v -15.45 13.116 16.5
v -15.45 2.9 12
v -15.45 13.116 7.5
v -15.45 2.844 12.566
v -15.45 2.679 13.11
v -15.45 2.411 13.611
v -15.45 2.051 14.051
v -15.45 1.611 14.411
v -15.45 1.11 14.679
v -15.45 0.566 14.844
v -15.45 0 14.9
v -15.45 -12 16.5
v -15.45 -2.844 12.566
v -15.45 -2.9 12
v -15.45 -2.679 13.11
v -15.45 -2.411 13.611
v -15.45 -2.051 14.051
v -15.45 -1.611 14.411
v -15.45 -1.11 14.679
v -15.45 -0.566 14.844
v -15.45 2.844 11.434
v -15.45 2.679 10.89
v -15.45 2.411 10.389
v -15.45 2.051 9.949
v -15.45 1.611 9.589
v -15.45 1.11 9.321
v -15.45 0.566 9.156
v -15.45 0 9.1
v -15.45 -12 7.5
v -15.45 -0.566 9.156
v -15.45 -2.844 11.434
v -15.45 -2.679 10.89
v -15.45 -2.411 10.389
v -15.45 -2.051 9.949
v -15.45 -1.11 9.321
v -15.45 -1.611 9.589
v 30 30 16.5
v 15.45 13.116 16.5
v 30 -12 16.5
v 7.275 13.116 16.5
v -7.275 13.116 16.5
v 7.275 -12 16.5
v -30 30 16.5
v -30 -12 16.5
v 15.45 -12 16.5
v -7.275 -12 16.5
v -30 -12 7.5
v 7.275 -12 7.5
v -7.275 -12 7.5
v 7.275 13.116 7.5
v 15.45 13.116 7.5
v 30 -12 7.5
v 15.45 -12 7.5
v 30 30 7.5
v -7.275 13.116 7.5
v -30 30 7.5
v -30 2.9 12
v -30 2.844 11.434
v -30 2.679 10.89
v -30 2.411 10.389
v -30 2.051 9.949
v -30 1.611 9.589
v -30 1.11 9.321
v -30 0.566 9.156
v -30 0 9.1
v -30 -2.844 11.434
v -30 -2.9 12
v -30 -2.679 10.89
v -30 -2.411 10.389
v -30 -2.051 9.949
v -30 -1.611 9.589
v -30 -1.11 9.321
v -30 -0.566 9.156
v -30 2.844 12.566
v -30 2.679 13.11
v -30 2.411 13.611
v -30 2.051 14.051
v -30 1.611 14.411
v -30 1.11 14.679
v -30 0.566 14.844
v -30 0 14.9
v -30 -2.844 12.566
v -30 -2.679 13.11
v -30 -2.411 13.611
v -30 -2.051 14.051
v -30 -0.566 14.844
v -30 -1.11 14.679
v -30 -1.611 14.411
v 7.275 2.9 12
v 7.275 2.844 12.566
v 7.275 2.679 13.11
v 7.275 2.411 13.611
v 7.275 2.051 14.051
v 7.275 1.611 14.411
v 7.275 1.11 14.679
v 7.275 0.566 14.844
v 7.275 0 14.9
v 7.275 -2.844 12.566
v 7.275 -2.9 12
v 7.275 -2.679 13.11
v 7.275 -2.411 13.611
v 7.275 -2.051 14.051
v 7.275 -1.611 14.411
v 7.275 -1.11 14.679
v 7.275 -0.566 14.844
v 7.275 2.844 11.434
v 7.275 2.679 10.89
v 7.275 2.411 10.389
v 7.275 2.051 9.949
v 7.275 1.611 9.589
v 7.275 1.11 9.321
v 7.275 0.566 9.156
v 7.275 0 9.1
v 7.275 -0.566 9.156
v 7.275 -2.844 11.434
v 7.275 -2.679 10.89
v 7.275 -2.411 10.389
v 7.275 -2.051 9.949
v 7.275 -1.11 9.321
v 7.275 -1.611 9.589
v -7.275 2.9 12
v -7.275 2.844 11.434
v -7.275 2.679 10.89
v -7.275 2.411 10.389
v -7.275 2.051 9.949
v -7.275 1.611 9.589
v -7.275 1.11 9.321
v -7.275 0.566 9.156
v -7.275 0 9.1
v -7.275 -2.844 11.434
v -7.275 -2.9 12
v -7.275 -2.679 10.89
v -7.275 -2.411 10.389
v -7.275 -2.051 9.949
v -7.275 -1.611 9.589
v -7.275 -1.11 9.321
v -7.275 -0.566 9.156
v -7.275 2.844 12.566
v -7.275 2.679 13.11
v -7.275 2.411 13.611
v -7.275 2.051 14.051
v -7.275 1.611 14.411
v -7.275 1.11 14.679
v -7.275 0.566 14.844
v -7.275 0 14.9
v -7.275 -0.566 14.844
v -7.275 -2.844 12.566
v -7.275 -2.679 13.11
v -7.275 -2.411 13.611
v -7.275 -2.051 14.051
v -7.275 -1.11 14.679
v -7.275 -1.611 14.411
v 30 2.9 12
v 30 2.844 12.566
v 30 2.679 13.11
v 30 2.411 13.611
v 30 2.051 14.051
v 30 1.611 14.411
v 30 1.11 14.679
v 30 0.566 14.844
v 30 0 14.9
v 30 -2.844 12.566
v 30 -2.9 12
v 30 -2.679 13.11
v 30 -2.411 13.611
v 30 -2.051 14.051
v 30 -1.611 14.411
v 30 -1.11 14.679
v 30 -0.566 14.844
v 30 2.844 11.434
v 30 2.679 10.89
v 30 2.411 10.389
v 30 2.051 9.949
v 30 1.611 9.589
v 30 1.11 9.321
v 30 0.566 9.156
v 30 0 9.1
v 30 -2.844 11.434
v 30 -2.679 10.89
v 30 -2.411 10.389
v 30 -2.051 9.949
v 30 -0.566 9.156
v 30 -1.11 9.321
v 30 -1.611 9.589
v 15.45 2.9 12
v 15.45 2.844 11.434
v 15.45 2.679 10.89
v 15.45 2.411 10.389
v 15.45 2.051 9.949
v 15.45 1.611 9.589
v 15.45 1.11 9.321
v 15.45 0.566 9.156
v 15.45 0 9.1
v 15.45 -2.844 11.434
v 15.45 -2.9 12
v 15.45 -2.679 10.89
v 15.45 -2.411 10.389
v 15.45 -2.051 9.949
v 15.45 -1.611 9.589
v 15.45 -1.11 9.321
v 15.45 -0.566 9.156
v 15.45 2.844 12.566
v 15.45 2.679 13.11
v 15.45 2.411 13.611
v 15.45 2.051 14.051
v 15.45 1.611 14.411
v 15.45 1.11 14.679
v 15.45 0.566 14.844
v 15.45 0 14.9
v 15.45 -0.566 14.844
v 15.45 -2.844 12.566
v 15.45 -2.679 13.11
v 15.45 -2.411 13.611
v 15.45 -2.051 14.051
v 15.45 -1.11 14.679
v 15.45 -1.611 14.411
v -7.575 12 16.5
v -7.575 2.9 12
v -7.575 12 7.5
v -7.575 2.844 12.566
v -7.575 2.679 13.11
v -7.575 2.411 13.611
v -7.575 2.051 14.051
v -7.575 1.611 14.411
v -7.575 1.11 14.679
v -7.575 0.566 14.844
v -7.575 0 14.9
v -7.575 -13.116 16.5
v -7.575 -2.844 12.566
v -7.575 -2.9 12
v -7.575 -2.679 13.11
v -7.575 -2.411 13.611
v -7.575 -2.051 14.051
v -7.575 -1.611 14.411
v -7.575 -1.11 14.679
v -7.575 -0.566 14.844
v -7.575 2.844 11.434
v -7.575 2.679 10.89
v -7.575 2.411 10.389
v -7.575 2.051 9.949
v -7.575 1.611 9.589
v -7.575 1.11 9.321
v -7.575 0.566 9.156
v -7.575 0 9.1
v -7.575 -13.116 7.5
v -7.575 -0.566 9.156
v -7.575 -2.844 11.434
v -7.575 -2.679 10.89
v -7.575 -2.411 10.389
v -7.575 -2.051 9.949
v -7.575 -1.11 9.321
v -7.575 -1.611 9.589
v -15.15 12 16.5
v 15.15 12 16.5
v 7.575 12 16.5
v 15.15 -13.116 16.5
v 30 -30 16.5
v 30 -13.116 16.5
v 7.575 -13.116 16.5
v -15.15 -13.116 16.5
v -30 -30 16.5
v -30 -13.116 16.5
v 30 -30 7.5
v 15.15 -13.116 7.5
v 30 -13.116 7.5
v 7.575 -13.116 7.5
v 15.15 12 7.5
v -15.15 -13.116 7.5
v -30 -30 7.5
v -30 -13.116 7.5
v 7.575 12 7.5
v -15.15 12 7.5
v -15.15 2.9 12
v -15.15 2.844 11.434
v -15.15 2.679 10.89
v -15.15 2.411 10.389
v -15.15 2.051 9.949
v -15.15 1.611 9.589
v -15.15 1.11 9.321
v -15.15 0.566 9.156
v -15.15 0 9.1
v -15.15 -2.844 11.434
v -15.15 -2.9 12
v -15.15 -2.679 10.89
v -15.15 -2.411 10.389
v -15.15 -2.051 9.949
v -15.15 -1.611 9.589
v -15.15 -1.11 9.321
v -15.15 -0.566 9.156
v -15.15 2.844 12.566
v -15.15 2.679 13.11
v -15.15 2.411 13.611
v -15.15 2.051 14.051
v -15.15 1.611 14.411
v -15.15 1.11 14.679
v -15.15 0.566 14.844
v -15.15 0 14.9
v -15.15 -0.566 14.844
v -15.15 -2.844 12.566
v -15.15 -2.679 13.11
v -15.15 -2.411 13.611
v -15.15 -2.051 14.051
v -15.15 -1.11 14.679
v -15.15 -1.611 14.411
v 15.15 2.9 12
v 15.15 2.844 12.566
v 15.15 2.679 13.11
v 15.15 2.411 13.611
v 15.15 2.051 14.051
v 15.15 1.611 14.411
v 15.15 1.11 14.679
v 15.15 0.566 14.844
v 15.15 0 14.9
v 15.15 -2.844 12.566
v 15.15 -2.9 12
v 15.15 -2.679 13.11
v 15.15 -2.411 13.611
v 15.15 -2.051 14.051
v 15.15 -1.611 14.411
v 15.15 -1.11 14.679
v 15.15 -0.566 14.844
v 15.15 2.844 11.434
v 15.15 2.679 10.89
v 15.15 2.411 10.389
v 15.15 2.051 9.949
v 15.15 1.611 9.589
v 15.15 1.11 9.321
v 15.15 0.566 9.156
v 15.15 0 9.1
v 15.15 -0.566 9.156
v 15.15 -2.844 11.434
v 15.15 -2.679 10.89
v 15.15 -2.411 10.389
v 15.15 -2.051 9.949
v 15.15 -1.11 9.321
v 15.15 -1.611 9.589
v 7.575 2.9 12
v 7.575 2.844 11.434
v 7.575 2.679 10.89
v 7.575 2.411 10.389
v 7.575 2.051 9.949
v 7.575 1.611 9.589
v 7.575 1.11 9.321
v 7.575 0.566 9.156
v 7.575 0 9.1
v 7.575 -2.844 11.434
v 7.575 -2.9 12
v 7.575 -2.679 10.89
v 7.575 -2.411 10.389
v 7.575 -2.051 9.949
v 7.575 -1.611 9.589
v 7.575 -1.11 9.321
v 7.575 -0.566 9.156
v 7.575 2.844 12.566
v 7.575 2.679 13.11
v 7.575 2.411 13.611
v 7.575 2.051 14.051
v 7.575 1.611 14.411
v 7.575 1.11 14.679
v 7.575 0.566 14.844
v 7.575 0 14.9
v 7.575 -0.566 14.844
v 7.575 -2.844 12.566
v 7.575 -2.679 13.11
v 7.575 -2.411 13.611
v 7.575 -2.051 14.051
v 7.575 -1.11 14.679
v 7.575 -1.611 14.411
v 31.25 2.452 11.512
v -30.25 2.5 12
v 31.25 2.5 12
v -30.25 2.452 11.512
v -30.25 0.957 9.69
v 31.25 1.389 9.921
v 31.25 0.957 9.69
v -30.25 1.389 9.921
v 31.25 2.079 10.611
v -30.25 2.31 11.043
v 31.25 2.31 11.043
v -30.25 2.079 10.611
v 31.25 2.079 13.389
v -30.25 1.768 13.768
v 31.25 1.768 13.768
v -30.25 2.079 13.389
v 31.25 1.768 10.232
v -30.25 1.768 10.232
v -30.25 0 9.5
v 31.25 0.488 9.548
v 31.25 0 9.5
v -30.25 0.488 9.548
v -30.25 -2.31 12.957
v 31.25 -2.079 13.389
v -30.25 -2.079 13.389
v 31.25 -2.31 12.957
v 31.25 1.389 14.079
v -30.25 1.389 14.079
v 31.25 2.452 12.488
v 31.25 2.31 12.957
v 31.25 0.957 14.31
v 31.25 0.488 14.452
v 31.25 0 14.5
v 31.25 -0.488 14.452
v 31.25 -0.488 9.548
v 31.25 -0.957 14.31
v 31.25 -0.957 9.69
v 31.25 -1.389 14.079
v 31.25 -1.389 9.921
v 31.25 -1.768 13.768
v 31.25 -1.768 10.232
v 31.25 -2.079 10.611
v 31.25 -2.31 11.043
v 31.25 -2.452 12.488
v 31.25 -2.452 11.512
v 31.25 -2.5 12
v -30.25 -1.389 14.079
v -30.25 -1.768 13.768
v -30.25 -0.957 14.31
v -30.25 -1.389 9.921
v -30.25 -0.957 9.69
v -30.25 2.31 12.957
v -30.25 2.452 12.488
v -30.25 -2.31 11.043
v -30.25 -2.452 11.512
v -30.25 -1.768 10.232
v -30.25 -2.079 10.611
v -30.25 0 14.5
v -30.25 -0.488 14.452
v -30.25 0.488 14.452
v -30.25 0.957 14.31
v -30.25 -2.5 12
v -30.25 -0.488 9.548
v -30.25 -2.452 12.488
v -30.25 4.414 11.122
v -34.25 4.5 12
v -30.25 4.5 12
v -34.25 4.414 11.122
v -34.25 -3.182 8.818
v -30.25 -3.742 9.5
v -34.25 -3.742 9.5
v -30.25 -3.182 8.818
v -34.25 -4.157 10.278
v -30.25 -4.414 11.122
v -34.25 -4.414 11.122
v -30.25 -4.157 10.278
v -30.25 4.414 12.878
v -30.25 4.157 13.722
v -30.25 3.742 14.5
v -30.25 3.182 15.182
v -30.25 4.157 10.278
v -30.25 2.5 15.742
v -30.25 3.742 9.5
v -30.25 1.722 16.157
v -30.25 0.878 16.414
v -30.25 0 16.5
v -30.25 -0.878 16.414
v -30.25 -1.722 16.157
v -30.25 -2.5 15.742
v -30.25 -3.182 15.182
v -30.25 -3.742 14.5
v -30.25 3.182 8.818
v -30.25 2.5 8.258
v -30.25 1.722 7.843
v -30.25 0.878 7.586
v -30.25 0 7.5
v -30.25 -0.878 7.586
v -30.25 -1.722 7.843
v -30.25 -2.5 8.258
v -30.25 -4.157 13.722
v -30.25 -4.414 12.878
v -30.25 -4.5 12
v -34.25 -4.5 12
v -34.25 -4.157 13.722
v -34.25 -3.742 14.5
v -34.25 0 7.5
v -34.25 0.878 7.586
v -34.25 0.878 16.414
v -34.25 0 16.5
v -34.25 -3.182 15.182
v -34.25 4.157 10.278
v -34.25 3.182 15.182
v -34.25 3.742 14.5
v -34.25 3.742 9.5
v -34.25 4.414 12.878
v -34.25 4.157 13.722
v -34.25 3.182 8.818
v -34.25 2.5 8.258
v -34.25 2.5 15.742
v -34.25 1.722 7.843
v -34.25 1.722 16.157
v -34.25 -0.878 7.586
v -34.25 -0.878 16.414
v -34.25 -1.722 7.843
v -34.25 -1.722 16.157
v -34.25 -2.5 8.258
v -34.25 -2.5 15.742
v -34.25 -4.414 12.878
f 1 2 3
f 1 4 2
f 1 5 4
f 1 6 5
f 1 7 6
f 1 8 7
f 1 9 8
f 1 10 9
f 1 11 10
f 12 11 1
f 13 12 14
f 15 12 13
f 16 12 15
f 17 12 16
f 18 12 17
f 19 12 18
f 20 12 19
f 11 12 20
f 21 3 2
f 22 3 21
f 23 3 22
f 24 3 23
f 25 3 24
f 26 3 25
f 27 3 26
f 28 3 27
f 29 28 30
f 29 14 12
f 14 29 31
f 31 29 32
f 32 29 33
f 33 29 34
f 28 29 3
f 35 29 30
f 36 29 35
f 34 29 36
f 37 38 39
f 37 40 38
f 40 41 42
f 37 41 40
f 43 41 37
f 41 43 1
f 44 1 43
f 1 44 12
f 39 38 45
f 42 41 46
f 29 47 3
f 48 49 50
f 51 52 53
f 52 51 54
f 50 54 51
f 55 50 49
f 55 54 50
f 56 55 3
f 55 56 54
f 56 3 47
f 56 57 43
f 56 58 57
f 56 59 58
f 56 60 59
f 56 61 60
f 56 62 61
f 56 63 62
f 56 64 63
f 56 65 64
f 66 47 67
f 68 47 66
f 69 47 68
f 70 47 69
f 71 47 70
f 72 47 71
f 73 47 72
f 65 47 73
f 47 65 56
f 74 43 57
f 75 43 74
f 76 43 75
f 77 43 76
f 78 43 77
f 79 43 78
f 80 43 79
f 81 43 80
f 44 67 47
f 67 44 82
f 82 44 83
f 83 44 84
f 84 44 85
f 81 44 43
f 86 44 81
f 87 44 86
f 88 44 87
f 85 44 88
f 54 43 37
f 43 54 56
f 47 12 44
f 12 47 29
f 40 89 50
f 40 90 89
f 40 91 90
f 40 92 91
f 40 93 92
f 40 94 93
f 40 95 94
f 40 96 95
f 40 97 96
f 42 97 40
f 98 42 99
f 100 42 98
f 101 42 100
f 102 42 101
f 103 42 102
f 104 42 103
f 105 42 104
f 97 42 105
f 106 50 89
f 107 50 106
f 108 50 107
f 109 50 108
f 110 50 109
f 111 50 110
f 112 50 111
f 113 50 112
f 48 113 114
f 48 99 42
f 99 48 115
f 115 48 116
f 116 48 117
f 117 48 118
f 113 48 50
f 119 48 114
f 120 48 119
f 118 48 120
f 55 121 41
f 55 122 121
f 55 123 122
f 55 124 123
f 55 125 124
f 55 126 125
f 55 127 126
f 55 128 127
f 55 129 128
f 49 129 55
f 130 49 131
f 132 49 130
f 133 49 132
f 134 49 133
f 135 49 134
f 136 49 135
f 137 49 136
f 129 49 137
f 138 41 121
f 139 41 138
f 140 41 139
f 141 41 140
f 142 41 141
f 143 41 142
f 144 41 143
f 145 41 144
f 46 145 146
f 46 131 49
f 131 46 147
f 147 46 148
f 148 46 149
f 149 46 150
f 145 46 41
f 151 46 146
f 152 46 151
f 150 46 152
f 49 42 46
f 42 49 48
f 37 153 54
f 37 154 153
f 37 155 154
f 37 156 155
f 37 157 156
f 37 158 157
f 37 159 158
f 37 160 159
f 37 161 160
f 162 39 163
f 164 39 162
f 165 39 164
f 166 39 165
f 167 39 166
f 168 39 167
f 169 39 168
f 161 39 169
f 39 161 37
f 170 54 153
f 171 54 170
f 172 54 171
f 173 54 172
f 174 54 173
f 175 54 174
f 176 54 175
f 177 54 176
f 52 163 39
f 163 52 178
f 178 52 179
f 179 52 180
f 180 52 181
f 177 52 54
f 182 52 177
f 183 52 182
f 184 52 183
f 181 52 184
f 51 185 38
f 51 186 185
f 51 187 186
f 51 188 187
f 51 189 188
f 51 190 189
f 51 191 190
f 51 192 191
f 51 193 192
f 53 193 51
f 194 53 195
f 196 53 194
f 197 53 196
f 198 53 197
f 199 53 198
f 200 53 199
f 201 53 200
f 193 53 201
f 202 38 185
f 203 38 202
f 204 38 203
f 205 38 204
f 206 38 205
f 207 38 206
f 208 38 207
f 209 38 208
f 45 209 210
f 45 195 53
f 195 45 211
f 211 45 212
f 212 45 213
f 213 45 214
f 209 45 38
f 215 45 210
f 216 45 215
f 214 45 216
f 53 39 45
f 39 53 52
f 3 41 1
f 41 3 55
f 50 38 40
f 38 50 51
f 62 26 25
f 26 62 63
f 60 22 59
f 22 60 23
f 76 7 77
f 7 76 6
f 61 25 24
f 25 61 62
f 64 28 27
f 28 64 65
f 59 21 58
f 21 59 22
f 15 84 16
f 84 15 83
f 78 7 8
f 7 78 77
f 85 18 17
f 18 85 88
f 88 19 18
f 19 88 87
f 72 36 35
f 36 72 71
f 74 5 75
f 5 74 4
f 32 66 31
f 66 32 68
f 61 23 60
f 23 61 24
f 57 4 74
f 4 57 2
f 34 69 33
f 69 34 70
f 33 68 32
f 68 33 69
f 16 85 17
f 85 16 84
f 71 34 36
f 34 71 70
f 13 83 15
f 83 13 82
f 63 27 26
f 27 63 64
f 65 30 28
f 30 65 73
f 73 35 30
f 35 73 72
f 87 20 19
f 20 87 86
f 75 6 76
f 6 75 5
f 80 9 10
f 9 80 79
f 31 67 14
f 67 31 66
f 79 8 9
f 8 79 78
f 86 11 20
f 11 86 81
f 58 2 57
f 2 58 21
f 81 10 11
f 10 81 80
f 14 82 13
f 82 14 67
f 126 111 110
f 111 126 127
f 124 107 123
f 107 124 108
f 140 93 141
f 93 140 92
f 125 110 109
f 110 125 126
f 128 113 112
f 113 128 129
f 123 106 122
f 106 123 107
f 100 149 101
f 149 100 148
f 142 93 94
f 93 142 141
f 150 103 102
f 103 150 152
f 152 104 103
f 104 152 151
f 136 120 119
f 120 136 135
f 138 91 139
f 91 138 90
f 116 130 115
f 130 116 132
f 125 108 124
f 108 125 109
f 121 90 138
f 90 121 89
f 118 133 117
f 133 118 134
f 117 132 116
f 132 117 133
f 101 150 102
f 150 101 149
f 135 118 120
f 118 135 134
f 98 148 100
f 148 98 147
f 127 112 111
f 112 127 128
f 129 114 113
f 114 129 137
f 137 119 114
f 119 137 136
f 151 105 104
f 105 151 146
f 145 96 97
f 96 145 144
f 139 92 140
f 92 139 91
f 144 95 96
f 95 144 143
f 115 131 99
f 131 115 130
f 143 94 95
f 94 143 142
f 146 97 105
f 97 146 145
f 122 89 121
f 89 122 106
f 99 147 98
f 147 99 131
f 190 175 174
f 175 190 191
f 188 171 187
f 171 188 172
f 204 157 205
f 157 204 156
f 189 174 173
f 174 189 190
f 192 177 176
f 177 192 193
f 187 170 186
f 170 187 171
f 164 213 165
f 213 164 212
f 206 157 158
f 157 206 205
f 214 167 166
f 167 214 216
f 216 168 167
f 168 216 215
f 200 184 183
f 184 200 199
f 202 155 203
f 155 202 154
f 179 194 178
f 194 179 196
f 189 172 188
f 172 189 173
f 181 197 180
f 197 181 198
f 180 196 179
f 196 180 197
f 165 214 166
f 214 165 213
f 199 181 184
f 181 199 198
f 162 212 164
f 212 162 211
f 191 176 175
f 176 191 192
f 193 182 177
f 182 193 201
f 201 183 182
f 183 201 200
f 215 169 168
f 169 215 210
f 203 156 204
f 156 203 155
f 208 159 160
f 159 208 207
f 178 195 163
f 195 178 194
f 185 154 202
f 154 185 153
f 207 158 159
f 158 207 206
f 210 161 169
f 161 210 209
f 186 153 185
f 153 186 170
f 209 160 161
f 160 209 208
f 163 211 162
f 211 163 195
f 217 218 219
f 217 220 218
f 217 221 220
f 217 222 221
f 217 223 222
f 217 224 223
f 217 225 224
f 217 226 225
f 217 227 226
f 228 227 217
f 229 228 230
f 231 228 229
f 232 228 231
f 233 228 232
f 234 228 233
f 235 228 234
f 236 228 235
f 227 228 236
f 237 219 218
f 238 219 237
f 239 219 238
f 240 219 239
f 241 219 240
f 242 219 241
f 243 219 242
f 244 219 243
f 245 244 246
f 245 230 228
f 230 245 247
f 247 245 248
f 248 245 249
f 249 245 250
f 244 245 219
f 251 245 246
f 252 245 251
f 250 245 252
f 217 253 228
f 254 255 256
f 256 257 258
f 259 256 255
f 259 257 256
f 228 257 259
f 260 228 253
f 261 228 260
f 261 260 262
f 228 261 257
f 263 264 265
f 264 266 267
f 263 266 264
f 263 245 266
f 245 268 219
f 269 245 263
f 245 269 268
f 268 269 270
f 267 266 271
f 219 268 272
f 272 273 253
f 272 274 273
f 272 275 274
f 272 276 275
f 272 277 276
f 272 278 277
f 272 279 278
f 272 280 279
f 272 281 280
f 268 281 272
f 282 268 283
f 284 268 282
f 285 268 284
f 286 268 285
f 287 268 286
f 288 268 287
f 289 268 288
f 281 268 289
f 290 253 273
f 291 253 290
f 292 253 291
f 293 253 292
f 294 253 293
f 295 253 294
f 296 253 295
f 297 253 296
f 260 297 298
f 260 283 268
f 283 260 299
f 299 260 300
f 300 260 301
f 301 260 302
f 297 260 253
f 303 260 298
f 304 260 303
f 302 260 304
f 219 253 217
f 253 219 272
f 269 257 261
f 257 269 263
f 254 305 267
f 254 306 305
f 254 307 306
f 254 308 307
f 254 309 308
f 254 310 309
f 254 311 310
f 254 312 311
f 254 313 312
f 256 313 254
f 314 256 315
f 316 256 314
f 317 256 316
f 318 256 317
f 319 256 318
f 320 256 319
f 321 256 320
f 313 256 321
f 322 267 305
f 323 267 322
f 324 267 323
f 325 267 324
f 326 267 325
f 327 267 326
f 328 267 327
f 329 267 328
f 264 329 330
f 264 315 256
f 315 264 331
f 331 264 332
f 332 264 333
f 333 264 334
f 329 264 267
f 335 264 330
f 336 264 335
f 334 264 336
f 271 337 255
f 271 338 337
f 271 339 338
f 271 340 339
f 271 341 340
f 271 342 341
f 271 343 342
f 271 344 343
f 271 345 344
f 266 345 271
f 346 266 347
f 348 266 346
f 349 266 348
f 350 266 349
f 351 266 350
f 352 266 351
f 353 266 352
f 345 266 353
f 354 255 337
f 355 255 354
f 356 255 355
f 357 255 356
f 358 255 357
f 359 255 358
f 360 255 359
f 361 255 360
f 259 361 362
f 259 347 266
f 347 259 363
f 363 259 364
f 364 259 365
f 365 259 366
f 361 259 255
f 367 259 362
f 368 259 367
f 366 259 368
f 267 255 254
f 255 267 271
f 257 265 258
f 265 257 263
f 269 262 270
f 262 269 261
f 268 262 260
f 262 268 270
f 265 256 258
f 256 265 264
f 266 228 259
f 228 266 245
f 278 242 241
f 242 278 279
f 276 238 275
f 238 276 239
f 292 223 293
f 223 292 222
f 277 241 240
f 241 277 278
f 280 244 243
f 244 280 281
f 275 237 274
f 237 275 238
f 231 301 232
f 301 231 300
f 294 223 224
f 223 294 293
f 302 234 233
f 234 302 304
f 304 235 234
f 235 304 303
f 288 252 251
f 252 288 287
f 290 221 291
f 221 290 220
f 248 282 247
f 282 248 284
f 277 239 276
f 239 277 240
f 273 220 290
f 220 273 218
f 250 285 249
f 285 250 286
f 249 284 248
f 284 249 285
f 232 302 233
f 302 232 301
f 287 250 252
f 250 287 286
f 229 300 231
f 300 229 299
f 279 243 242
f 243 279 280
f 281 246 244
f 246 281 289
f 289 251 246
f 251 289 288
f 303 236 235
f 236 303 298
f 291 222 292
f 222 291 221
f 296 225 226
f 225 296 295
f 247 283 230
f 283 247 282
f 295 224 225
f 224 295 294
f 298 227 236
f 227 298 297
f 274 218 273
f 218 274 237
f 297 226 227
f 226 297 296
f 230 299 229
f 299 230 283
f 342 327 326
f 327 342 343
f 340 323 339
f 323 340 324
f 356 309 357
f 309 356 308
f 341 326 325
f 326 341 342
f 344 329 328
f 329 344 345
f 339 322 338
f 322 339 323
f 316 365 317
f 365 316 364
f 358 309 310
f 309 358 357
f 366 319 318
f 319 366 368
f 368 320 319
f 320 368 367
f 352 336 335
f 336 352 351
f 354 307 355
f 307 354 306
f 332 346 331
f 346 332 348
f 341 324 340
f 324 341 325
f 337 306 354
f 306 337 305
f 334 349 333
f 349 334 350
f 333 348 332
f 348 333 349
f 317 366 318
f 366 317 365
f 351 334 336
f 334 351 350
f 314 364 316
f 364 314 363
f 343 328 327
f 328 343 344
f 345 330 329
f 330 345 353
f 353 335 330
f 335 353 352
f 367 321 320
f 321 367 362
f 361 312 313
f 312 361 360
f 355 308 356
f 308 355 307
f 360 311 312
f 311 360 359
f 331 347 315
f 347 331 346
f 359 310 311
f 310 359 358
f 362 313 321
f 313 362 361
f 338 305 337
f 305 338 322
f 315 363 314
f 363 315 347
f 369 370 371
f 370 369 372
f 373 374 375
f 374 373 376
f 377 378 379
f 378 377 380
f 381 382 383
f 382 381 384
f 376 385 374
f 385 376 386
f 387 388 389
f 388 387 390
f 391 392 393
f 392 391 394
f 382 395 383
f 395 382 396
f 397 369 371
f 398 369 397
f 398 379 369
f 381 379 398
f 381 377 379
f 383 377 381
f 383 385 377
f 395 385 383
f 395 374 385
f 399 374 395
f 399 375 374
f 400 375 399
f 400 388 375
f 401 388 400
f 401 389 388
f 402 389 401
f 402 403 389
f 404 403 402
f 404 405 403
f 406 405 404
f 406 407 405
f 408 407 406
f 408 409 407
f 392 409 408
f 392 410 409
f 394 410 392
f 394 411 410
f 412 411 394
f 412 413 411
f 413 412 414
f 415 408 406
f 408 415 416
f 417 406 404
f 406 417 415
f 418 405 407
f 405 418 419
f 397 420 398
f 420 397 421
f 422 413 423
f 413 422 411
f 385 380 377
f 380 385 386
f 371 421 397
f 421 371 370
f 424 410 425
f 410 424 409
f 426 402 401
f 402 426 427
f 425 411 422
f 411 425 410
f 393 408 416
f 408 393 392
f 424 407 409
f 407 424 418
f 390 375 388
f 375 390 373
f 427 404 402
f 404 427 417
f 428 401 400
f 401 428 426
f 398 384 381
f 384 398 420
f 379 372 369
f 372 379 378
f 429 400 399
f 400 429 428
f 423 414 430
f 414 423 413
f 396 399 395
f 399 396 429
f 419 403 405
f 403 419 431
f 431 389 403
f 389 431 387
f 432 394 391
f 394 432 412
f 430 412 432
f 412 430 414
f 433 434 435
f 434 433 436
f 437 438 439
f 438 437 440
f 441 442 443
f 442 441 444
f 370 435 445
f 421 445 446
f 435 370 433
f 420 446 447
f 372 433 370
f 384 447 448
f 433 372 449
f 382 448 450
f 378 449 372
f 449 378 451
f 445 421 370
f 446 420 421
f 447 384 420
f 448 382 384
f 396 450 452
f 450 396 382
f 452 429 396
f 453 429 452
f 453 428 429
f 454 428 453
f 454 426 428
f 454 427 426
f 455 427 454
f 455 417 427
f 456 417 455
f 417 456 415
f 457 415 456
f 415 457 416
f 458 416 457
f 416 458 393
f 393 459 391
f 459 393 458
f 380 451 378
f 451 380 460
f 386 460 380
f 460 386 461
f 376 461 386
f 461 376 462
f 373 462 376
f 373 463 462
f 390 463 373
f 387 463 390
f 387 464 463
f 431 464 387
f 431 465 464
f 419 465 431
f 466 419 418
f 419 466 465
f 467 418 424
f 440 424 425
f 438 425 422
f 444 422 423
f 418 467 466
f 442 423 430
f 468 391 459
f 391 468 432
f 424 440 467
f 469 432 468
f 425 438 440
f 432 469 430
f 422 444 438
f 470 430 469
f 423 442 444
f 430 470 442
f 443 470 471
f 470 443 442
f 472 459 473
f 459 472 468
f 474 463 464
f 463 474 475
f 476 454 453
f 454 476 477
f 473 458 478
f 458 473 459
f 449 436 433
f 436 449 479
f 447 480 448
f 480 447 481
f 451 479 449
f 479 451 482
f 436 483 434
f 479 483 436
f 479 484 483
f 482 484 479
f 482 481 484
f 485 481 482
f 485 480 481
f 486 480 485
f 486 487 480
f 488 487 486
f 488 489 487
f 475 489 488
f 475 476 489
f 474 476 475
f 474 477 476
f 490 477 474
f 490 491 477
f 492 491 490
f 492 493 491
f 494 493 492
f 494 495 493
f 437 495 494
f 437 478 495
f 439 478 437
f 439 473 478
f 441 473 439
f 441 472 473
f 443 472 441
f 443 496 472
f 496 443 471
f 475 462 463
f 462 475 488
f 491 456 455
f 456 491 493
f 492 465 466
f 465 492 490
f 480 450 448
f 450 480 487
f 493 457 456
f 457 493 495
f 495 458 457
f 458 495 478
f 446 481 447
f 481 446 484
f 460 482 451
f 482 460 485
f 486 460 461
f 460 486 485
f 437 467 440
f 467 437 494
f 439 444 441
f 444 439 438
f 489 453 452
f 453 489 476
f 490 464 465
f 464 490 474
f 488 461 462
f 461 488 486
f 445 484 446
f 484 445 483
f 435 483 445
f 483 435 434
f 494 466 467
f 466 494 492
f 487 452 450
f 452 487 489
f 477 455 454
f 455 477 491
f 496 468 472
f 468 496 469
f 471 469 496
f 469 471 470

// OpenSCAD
$fn = 32;

// ------------------------------------------------------------------------
// Butt hinge: hinge 60 mm, leaf swung 0 deg
// Every part is its own module, assembly() places every instance.
// ------------------------------------------------------------------------

// --- part 1 ---
module hinge_base() {
  difference() {
    union() {
      translate([-30, -12, -4.5]) cube([14.55, 42, 9]);
      translate([-7.275, -12, -4.5]) cube([14.55, 42, 9]);
      translate([15.45, -12, -4.5]) cube([14.55, 42, 9]);
      translate([-30, 13.116, -4.5]) cube([60, 16.884, 9]);
    }
    translate([-22.725, 0, 0]) rotate([0, 90, 0]) cylinder(h = 16.55, d = 5.8, center = true);
    translate([0, 0, 0]) rotate([0, 90, 0]) cylinder(h = 16.55, d = 5.8, center = true);
    translate([22.725, 0, 0]) rotate([0, 90, 0]) cylinder(h = 16.55, d = 5.8, center = true);
  }
}

// --- part 2 ---
module hinge_mover() {
  difference() {
    union() {
      translate([-15.15, -30, -4.5]) cube([7.575, 42, 9]);
      translate([7.575, -30, -4.5]) cube([7.575, 42, 9]);
      translate([-30, -30, -4.5]) cube([60, 16.884, 9]);
    }
    translate([-11.362, 0, 0]) rotate([0, 90, 0]) cylinder(h = 9.575, d = 5.8, center = true);
    translate([11.362, 0, 0]) rotate([0, 90, 0]) cylinder(h = 9.575, d = 5.8, center = true);
  }
}

// --- part 3 ---
module hinge_pin() {
  rotate([0, 90, 0]) cylinder(h = 62.5, d = 5, center = true);
  translate([-34.25, 0, 0]) rotate([0, 90, 0]) cylinder(h = 4, d = 9);
}

// --- assembly ---
module assembly() {
  color([0.80, 0.24, 0.20]) translate([0, 0, 12]) rotate([0, 0, 0]) hinge_base();
  color([0.20, 0.45, 0.75]) translate([0, 0, 12]) rotate([0, 0, 0]) hinge_mover();
  color([0.25, 0.62, 0.32]) translate([0, 0, 12]) rotate([0, 0, 0]) hinge_pin();
}

assembly();
